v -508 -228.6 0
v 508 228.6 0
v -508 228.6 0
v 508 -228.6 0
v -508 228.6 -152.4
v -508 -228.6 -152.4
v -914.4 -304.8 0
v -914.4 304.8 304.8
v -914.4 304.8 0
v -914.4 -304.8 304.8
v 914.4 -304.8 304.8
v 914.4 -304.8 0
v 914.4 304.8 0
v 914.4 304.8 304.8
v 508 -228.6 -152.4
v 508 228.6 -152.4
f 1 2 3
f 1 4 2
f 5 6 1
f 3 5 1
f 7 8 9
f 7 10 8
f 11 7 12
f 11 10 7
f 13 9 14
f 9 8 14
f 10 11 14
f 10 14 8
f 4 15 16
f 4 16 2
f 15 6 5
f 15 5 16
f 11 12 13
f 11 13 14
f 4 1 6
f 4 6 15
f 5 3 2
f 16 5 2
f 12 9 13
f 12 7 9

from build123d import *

# Parameters (mm, degrees)
F1_DEPTH = 304.8
F0_W     = 508
F0_H     = 152.4
F2_DEPTH = 228.6


with BuildPart() as f1:
    # F0 (on Front) → F1 (new body, symmetric)
    with BuildSketch(Plane.XZ):
        Polygon((-914.4, 0), (-508, 0), (0, 0), (508, 0), (914.4, 0), (914.4, 304.8), (-914.4, 304.8), align=None)
    extrude(amount=F1_DEPTH, both=True)


with BuildPart() as f2:
    # F0 (on Front) → F2 (new body, symmetric)
    with BuildSketch(Plane.XZ):
        with Locations((-254, -76.2)):
            Rectangle(F0_W, F0_H)
        with Locations((254, -76.2)):
            Rectangle(F0_W, F0_H)
    extrude(amount=F2_DEPTH, both=True)


solid = Compound([f1.part, f2.part])
